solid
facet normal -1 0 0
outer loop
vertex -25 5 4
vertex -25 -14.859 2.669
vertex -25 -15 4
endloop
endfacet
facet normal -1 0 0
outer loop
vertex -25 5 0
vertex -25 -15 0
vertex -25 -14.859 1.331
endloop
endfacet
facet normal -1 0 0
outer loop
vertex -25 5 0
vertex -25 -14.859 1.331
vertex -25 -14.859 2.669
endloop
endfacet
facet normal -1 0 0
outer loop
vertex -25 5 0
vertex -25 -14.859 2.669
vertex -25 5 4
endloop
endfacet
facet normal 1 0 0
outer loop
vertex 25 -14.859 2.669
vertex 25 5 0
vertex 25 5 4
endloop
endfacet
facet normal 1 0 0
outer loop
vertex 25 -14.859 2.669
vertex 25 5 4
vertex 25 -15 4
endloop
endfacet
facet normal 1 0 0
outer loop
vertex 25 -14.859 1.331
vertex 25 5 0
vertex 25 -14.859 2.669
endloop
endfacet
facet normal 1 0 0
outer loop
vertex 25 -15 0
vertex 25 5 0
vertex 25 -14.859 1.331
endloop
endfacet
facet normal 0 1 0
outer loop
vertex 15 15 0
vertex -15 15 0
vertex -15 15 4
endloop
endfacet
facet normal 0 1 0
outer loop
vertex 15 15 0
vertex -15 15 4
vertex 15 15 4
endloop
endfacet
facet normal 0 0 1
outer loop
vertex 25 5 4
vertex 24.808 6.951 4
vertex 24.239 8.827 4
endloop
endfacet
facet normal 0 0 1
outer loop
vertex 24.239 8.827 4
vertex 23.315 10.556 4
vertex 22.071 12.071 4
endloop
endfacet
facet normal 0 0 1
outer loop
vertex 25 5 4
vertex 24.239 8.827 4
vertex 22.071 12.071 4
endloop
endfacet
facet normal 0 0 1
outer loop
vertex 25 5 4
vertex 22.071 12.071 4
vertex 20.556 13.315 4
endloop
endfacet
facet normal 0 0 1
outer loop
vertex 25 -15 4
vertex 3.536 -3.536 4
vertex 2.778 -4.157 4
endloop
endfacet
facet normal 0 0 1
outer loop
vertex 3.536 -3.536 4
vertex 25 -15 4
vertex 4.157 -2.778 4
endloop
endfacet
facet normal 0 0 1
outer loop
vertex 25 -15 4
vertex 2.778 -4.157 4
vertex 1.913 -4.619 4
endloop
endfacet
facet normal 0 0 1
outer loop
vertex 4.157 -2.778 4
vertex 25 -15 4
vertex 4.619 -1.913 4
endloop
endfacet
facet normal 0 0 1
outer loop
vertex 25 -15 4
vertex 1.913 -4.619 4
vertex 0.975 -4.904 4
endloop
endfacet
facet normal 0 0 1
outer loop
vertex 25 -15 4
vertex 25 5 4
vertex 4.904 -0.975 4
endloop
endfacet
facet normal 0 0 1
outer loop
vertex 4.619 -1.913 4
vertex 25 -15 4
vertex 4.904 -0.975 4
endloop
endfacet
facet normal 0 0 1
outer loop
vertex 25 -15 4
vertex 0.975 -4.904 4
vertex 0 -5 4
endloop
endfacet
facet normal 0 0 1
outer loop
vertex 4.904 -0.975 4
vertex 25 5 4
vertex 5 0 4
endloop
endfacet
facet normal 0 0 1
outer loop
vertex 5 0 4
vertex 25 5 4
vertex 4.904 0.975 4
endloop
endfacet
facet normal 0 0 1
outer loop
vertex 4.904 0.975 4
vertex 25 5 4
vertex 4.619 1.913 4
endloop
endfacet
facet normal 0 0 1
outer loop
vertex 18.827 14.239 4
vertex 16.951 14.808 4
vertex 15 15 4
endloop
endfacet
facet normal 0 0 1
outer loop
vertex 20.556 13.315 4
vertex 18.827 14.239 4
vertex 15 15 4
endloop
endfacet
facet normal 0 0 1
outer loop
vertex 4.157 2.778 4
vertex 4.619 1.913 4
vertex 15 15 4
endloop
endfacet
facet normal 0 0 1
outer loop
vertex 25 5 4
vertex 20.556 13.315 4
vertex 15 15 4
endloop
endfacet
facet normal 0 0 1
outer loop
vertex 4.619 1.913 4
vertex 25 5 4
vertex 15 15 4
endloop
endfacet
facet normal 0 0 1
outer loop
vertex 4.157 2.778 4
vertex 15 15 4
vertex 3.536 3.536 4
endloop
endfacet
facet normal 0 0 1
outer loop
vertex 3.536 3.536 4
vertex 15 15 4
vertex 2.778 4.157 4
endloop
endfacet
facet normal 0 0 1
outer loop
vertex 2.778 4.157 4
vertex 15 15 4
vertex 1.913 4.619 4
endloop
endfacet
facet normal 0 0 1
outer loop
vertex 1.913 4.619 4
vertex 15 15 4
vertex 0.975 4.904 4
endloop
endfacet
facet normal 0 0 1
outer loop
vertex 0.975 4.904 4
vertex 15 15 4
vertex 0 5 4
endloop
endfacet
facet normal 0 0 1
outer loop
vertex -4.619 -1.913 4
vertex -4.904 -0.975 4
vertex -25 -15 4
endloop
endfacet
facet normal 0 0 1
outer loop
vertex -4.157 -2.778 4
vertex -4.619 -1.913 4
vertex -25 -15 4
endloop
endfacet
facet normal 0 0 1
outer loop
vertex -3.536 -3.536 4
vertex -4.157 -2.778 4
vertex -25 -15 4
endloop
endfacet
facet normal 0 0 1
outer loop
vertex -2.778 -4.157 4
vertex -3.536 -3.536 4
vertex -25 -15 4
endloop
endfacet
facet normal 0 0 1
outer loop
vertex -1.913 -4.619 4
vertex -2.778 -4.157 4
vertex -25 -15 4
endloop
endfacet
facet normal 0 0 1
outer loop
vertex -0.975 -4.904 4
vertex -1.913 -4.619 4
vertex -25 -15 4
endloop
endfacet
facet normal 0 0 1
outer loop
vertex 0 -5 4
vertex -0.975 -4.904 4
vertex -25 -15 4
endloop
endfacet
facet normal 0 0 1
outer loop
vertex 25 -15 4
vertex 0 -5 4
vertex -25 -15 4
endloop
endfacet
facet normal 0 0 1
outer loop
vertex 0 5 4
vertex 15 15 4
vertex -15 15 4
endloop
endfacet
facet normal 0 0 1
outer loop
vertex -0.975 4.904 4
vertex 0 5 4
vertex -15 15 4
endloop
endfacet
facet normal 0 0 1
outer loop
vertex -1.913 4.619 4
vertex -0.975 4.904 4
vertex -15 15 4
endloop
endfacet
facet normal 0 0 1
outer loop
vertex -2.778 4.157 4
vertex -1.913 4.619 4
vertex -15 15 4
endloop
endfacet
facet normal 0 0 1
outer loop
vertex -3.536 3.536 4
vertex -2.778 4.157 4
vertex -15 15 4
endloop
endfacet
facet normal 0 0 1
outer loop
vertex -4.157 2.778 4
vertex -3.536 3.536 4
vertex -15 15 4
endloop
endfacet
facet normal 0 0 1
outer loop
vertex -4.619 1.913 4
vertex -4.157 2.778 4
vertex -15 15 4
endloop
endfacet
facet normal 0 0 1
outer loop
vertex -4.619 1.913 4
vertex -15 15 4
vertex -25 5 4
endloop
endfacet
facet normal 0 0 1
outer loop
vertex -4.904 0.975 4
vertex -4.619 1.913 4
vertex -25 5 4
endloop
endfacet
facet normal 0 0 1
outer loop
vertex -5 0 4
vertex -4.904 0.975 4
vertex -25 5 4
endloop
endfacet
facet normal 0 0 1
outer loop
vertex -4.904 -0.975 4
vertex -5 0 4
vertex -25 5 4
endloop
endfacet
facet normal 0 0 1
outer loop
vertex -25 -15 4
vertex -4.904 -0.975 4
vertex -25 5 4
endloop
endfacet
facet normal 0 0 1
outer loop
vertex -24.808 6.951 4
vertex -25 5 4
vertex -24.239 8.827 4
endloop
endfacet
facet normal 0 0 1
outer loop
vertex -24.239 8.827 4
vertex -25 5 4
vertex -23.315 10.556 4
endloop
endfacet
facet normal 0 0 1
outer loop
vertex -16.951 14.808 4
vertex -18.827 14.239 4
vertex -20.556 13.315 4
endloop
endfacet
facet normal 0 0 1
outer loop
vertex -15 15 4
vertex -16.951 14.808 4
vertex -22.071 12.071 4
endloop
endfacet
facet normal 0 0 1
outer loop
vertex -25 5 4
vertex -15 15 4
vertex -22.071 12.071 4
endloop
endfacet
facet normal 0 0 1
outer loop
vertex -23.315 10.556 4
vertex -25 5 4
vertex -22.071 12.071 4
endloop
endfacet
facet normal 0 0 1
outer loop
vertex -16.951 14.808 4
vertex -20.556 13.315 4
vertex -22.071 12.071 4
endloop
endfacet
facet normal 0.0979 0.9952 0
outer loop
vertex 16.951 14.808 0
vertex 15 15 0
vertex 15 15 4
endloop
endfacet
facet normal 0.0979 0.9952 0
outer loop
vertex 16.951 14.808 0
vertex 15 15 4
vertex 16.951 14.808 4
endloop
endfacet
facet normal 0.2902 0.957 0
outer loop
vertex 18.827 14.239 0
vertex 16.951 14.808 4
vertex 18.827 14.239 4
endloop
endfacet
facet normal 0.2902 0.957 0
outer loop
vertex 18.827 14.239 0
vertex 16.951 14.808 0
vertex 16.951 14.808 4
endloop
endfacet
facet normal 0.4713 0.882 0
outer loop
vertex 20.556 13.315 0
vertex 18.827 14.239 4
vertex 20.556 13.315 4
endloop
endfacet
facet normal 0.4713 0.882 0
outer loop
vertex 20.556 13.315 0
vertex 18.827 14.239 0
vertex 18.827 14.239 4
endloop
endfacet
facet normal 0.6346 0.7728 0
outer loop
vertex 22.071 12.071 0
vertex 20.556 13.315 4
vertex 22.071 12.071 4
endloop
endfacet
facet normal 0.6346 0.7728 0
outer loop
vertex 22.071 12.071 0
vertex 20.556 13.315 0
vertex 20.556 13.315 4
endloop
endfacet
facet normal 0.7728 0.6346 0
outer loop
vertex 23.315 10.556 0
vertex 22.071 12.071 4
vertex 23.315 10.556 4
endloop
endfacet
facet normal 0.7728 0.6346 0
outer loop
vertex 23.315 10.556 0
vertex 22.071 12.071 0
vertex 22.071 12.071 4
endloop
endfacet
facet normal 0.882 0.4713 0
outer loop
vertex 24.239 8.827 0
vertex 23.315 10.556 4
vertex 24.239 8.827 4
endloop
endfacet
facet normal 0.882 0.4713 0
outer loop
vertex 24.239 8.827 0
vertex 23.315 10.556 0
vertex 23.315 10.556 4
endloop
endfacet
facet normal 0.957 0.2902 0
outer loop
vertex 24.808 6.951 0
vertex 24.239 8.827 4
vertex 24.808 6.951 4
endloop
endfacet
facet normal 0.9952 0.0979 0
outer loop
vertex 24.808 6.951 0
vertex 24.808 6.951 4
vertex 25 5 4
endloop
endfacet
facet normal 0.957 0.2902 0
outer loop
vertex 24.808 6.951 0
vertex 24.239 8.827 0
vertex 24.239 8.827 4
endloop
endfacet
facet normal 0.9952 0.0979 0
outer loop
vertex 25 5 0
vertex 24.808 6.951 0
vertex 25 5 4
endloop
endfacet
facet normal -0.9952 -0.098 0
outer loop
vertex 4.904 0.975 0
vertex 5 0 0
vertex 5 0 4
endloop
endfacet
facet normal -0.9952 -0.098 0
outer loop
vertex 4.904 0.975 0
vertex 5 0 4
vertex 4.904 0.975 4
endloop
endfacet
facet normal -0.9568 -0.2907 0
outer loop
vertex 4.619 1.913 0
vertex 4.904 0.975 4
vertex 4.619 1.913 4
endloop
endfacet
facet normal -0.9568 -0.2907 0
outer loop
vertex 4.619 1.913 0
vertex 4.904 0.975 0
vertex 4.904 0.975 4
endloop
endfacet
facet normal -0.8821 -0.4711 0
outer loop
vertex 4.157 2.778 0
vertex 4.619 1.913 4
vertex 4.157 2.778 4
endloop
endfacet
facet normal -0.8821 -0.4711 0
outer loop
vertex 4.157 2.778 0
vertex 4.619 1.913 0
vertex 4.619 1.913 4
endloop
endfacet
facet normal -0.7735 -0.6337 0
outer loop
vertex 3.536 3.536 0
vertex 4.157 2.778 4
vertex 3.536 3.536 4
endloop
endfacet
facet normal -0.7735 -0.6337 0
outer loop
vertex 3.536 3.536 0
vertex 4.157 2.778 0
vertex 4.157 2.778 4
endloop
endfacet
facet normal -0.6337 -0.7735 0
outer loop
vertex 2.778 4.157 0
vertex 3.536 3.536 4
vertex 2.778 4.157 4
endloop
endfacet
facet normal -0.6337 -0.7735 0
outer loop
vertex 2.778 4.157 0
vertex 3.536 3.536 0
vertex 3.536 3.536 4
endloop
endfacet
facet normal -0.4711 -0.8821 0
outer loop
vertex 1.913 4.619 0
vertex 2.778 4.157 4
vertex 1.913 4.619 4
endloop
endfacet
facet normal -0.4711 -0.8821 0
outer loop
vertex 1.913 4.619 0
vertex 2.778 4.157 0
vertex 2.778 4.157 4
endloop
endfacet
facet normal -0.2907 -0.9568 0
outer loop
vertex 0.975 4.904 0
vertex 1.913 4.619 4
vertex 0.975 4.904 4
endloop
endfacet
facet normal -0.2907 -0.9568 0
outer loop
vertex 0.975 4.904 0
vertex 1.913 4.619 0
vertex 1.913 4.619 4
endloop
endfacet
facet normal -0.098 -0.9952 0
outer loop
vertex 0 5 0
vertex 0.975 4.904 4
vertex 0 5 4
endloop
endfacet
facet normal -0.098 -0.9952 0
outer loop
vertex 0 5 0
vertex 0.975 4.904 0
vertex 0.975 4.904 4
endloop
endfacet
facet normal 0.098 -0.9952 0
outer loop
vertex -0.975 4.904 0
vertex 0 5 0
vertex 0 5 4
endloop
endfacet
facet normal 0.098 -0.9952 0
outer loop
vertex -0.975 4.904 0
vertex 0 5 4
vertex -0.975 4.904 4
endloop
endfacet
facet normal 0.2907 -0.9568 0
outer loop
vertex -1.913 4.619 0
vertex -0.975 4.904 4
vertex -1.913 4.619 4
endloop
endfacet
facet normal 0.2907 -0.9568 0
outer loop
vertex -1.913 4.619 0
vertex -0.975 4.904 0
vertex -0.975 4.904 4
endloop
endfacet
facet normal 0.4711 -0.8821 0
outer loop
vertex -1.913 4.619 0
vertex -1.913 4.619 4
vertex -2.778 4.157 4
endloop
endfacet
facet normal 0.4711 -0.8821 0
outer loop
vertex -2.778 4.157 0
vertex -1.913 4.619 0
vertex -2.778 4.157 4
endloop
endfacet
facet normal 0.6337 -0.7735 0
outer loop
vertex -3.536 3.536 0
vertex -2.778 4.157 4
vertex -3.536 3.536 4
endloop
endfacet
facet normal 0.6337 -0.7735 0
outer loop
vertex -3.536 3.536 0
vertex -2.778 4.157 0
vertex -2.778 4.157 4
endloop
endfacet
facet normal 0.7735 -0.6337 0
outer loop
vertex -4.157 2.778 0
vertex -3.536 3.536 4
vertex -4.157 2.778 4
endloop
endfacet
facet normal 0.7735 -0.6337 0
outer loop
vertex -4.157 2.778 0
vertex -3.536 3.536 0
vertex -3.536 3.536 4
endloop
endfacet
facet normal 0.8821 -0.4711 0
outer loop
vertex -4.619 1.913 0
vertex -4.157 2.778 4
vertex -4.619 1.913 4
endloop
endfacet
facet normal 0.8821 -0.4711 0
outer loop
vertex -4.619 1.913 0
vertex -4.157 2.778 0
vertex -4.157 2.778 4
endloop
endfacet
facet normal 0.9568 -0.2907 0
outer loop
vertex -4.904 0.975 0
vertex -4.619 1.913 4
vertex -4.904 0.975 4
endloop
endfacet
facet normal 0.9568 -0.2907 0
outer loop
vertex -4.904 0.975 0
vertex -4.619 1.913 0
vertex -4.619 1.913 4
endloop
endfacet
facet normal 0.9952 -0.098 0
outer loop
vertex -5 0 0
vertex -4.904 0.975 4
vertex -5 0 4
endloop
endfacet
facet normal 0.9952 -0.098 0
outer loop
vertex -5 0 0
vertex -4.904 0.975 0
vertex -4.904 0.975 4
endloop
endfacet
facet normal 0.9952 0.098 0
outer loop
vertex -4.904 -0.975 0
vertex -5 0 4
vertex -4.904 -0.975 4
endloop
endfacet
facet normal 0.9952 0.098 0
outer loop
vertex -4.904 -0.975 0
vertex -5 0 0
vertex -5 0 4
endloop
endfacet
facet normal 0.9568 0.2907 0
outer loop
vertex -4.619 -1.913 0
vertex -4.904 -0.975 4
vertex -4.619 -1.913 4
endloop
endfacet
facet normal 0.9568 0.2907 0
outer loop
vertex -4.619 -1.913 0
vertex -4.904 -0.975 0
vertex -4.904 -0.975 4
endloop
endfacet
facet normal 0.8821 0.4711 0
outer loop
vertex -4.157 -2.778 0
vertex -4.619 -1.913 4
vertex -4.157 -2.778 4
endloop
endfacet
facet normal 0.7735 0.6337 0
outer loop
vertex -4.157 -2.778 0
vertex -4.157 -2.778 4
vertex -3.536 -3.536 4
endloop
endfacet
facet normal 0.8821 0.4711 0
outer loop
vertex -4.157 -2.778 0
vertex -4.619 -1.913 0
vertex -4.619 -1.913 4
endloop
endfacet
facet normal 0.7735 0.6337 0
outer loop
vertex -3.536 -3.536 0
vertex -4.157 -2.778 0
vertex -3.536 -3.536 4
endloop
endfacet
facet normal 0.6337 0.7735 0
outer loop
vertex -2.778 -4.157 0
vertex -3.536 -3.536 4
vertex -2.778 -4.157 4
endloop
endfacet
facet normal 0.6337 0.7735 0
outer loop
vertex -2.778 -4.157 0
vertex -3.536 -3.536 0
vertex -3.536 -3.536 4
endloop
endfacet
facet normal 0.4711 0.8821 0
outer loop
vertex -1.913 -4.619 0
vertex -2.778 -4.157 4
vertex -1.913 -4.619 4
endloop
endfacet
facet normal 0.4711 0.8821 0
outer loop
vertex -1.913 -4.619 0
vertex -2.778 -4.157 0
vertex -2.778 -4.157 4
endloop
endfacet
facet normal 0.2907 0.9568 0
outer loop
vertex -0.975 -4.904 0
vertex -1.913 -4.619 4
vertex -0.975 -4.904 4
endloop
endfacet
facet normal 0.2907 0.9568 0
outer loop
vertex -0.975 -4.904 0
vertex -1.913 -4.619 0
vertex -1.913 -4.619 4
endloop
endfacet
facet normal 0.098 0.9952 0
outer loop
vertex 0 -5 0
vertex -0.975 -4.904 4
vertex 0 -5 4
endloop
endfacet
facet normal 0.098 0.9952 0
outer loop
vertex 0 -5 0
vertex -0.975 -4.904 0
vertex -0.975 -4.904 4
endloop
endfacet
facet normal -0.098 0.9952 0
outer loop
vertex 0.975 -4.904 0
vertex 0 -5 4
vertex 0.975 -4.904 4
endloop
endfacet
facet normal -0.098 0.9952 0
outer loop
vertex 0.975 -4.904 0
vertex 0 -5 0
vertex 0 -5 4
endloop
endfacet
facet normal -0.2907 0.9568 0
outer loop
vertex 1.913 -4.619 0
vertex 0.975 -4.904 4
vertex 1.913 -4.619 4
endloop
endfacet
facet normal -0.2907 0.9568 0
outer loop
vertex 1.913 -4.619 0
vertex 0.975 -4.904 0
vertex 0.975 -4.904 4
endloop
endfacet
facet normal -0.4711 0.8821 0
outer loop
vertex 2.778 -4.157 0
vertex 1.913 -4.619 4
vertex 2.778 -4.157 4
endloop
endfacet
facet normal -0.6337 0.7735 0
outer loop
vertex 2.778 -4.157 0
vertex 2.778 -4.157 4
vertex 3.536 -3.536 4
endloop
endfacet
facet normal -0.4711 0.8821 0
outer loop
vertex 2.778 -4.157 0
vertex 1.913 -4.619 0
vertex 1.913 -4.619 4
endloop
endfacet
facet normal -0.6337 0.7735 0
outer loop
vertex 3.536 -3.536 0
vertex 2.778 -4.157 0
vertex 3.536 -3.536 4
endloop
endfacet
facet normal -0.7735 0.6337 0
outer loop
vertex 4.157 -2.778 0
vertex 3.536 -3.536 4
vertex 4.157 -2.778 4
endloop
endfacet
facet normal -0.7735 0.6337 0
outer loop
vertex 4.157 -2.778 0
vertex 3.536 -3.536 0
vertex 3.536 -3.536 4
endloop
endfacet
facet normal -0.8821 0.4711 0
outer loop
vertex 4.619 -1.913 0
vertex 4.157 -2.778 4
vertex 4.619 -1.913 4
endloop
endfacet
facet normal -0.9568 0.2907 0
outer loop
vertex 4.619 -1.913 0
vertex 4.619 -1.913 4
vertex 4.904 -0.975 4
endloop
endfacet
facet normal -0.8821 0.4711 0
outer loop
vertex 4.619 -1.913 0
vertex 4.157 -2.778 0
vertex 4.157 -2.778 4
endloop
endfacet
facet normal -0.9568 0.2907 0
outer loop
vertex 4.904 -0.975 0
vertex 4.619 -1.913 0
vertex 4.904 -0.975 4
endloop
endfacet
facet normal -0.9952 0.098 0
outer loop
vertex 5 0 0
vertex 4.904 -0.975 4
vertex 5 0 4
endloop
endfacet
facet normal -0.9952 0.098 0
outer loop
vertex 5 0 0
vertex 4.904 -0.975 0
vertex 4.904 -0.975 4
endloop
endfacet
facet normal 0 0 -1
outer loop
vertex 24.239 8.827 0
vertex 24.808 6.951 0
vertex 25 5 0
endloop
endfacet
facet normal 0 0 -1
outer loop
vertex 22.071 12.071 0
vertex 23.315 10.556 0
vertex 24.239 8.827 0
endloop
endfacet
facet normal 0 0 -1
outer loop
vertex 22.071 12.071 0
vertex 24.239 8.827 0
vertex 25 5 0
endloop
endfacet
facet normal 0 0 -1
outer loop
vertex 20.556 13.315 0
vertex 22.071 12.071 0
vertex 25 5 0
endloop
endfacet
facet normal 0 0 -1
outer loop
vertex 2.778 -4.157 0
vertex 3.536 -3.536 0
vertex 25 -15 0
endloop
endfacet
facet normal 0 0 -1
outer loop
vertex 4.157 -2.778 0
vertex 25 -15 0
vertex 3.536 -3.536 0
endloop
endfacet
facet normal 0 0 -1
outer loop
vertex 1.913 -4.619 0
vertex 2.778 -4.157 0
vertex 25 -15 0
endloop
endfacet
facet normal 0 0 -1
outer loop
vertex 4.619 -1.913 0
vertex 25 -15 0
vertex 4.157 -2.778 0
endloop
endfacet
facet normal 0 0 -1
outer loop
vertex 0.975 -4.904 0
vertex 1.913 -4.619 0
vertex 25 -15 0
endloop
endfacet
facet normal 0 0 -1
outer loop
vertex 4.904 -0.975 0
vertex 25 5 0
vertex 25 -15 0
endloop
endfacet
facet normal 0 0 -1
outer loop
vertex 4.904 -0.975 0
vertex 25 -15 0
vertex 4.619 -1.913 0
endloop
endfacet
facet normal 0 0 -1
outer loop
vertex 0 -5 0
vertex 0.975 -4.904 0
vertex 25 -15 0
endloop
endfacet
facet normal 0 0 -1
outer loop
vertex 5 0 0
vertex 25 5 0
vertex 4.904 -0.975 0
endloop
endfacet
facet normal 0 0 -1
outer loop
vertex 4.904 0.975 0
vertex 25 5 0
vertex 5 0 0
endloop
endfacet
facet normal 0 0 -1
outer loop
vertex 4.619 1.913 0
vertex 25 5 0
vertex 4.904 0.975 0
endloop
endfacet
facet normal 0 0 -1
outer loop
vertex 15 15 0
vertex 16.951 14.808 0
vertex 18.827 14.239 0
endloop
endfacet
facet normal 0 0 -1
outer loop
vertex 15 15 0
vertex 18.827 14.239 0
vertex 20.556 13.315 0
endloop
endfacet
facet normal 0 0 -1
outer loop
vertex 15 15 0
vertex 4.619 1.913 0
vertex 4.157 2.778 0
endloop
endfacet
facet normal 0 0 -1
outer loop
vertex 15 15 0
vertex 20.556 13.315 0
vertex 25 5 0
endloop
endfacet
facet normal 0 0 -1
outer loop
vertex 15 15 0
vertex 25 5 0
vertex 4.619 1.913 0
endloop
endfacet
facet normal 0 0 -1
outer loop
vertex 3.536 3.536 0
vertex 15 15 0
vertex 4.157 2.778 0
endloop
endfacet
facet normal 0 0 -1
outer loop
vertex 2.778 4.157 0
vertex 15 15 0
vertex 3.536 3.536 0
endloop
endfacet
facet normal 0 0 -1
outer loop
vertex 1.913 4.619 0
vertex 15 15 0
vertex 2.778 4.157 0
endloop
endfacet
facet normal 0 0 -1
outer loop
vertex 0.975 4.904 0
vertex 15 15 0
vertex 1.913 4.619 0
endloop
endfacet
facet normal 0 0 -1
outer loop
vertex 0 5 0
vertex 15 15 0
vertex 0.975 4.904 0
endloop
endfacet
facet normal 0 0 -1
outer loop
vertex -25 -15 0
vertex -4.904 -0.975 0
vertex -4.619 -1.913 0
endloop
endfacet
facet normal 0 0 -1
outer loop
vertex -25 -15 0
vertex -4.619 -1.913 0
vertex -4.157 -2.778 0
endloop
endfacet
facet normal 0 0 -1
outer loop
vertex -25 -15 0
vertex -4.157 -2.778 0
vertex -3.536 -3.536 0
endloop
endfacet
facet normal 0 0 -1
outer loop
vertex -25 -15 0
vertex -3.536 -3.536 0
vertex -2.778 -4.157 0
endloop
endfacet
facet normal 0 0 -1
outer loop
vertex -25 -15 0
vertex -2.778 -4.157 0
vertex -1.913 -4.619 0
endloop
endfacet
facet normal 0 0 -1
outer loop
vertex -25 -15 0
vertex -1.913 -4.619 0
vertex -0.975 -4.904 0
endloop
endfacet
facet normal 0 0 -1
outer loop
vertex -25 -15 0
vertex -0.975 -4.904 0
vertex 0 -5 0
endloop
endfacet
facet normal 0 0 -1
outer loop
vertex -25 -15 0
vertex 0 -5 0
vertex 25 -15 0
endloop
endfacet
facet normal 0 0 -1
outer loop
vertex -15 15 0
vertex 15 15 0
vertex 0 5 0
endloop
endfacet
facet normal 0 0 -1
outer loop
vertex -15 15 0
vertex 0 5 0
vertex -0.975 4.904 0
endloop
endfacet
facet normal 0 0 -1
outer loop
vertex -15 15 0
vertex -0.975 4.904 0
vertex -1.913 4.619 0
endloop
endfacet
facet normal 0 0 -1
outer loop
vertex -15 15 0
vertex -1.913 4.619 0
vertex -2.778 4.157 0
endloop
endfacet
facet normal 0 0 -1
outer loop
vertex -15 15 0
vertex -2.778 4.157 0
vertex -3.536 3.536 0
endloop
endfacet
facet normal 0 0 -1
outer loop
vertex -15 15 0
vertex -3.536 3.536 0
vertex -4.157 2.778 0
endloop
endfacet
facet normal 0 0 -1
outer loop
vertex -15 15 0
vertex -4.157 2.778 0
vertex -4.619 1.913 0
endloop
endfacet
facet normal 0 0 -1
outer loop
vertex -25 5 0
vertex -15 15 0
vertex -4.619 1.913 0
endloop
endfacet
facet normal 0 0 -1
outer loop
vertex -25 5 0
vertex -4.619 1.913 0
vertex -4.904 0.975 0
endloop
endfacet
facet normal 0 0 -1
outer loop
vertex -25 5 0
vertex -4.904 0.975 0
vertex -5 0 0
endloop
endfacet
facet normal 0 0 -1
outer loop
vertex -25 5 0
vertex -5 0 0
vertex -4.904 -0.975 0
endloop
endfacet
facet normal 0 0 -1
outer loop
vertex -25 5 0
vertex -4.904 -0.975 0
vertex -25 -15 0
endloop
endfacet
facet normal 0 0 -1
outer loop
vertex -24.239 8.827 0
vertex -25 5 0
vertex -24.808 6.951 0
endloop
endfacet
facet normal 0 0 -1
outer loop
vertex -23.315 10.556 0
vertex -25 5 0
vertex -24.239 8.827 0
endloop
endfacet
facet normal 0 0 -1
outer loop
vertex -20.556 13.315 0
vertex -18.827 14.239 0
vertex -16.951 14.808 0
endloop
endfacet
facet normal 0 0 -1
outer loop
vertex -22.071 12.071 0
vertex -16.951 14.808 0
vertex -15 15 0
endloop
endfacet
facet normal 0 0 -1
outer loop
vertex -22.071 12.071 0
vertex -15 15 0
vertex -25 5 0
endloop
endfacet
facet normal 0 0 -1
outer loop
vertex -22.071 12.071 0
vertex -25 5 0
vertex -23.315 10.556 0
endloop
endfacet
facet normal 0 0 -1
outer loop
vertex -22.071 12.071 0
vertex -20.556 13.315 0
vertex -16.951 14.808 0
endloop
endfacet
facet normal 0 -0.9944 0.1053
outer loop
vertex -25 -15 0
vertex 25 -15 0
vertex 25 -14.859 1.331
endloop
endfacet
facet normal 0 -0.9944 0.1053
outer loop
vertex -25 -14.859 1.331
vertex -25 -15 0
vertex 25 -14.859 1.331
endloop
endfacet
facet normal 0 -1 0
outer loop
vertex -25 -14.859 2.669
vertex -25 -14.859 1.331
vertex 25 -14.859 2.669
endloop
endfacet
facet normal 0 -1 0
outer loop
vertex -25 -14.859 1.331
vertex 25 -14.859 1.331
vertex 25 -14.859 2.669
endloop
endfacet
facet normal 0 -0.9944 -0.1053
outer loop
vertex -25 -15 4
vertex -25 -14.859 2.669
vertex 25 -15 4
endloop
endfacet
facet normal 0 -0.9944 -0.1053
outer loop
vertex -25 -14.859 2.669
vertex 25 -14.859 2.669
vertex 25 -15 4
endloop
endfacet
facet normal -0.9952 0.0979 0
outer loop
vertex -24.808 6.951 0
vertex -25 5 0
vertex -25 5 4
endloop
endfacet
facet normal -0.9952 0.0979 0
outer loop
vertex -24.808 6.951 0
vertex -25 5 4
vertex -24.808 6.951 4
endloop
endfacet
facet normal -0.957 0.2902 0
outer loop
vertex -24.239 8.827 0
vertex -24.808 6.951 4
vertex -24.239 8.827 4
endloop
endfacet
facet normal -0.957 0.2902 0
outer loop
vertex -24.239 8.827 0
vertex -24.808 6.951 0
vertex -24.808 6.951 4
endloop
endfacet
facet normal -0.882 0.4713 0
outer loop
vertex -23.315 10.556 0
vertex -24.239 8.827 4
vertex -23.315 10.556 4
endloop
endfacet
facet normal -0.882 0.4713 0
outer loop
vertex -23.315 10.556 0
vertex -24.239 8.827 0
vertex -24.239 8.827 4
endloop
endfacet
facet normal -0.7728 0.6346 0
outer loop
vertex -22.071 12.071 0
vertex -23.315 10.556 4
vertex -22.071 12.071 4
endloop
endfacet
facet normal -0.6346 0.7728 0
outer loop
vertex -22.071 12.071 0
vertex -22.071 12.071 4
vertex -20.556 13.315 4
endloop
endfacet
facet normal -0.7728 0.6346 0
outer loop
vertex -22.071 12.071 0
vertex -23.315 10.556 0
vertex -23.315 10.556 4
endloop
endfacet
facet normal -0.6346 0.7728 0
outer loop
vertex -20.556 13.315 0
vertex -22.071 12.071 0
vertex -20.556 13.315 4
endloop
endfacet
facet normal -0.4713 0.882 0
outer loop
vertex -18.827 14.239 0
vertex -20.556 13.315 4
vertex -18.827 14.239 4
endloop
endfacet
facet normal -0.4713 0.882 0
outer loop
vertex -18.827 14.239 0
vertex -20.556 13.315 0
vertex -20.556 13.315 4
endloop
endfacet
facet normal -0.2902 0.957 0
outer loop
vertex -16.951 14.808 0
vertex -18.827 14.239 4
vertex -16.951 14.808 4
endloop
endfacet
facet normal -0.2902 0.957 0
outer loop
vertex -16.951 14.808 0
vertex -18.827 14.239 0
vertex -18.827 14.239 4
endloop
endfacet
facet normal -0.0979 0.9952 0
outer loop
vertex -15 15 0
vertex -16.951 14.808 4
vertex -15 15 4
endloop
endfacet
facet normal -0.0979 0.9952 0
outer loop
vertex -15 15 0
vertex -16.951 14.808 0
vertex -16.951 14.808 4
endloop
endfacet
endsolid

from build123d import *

# Parameters (mm, degrees)
SKETCH1_R           = 5
BOSS_EXTRUDE1_DEPTH = 4
CUT_EXTRUDE1_DEPTH  = 51


with BuildPart() as part:
    # Sketch1 → Boss-Extrude1 (new body)
    with BuildSketch(Plane.XY):
        with BuildLine():
            Line((-15, 15), (15, 15))
            ThreePointArc((15, 15), (22.071067812, 12.071067812), (25, 5))
            Line((25, 5), (25, -15))
            Line((25, -15), (-25, -15))
            Line((-25, -15), (-25, 5))
            ThreePointArc((-25, 5), (-22.071067812, 12.071067812), (-15, 15))
        make_face()
        Circle(SKETCH1_R, mode=Mode.SUBTRACT)
    extrude(amount=BOSS_EXTRUDE1_DEPTH)

    # Sketch2 → Cut-Extrude1 (cut)
    with BuildSketch(Plane(origin=(25, 0, 0), x_dir=(0, 0, -1), z_dir=(1, 0, 0))):
        with BuildLine():
            Line((-4, -15), (0, -15))
            ThreePointArc((0, -15), (-2, -14.841531007), (-4, -15))
        make_face()
    extrude(amount=-CUT_EXTRUDE1_DEPTH, mode=Mode.SUBTRACT)


solid = part.part
